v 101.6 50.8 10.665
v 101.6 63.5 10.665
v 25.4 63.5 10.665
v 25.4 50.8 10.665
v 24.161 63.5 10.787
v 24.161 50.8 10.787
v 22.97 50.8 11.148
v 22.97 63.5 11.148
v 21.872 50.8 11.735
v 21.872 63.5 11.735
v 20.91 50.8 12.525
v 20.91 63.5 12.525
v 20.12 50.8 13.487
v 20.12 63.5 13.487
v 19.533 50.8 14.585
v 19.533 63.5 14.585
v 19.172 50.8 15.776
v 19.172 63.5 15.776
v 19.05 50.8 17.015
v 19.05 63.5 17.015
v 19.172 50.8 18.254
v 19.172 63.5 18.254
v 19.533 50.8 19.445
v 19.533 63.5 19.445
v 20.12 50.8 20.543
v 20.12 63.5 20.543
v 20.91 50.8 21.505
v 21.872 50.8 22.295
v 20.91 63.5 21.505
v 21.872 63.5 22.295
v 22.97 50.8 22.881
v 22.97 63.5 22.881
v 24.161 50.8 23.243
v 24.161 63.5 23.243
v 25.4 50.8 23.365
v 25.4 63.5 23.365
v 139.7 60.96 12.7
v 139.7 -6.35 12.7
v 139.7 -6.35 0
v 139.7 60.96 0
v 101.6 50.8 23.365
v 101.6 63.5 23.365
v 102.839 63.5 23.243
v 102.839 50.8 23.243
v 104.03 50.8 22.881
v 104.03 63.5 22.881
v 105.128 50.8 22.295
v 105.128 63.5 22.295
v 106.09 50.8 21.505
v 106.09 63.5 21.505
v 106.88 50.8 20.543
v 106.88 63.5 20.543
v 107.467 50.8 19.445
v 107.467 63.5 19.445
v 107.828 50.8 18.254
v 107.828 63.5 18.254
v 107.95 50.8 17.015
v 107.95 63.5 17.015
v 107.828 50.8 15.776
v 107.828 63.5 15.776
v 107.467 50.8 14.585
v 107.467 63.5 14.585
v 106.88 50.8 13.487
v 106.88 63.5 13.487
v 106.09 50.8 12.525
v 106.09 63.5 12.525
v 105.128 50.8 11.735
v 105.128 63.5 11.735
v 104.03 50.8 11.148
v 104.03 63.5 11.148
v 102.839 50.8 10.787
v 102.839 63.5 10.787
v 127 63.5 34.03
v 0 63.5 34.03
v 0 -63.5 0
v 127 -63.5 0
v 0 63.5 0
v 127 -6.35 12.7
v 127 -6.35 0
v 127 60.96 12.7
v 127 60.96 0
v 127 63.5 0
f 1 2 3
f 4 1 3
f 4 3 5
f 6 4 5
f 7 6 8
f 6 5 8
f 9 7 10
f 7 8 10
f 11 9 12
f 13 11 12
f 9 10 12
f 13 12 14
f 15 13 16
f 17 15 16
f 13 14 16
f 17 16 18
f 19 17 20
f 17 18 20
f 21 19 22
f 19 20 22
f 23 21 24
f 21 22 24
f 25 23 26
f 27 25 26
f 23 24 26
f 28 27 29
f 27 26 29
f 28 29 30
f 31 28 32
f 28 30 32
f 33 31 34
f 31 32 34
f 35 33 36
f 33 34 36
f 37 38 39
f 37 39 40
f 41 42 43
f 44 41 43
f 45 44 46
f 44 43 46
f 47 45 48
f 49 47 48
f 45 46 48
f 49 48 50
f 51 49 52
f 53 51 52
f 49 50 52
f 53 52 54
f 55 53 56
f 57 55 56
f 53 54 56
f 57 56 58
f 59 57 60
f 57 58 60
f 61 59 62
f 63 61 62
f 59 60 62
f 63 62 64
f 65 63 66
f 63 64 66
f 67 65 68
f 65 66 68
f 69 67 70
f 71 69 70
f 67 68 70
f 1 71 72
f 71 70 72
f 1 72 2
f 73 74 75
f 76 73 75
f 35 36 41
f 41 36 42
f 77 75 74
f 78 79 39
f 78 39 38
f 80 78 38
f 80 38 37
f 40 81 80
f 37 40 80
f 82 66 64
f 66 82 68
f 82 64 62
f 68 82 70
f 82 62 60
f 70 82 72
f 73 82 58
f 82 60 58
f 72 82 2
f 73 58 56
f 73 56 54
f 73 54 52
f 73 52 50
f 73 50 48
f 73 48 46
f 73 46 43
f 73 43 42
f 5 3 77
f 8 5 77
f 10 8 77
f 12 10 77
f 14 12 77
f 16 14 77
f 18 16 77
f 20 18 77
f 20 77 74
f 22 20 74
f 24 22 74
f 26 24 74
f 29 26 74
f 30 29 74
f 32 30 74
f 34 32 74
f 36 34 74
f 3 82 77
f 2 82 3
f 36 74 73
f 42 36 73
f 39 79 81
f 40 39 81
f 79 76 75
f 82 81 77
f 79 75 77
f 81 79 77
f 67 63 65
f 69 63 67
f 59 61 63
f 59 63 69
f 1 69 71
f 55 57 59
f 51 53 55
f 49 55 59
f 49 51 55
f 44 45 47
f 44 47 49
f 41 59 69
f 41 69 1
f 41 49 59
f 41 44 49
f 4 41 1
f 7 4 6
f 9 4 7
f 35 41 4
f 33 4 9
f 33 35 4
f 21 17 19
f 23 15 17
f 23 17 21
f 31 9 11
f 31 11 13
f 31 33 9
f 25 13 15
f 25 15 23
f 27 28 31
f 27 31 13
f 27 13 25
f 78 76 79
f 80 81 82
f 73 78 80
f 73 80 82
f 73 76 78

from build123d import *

# Parameters (mm, degrees)
F1_DEPTH = 127
F2_W     = 67.31
F2_H     = 12.7
F3_DEPTH = 12.7
F5_DEPTH = 12.7


with BuildPart() as f1:
    # F0 (on Right) → F1 (new body)
    with BuildSketch(Plane.YZ):
        Polygon((63.5, 34.029547), (-63.5, 0), (63.5, 0), align=None)
    extrude(amount=F1_DEPTH)

    # F2 (on face) → F3 (join)
    with BuildSketch(Plane.YZ.offset(127)):
        with Locations((27.305, 6.35)):
            Rectangle(F2_W, F2_H)
    extrude(amount=F3_DEPTH)

    # F4 (on face) → F5 (cut)
    with BuildSketch(Plane(origin=(0, 63.5, 0), x_dir=(-1, 0, 0), z_dir=(0, 1, 0))):
        with BuildLine():
            ThreePointArc((-101.6, 23.364774), (-107.95, 17.014774), (-101.6, 10.664774))
            Line((-101.6, 10.664774), (-25.4, 10.664774))
            ThreePointArc((-25.4, 10.664774), (-19.05, 17.014774), (-25.4, 23.364774))
            Line((-25.4, 23.364774), (-101.6, 23.364774))
        make_face()
    extrude(amount=-F5_DEPTH, mode=Mode.SUBTRACT)


solid = f1.part
